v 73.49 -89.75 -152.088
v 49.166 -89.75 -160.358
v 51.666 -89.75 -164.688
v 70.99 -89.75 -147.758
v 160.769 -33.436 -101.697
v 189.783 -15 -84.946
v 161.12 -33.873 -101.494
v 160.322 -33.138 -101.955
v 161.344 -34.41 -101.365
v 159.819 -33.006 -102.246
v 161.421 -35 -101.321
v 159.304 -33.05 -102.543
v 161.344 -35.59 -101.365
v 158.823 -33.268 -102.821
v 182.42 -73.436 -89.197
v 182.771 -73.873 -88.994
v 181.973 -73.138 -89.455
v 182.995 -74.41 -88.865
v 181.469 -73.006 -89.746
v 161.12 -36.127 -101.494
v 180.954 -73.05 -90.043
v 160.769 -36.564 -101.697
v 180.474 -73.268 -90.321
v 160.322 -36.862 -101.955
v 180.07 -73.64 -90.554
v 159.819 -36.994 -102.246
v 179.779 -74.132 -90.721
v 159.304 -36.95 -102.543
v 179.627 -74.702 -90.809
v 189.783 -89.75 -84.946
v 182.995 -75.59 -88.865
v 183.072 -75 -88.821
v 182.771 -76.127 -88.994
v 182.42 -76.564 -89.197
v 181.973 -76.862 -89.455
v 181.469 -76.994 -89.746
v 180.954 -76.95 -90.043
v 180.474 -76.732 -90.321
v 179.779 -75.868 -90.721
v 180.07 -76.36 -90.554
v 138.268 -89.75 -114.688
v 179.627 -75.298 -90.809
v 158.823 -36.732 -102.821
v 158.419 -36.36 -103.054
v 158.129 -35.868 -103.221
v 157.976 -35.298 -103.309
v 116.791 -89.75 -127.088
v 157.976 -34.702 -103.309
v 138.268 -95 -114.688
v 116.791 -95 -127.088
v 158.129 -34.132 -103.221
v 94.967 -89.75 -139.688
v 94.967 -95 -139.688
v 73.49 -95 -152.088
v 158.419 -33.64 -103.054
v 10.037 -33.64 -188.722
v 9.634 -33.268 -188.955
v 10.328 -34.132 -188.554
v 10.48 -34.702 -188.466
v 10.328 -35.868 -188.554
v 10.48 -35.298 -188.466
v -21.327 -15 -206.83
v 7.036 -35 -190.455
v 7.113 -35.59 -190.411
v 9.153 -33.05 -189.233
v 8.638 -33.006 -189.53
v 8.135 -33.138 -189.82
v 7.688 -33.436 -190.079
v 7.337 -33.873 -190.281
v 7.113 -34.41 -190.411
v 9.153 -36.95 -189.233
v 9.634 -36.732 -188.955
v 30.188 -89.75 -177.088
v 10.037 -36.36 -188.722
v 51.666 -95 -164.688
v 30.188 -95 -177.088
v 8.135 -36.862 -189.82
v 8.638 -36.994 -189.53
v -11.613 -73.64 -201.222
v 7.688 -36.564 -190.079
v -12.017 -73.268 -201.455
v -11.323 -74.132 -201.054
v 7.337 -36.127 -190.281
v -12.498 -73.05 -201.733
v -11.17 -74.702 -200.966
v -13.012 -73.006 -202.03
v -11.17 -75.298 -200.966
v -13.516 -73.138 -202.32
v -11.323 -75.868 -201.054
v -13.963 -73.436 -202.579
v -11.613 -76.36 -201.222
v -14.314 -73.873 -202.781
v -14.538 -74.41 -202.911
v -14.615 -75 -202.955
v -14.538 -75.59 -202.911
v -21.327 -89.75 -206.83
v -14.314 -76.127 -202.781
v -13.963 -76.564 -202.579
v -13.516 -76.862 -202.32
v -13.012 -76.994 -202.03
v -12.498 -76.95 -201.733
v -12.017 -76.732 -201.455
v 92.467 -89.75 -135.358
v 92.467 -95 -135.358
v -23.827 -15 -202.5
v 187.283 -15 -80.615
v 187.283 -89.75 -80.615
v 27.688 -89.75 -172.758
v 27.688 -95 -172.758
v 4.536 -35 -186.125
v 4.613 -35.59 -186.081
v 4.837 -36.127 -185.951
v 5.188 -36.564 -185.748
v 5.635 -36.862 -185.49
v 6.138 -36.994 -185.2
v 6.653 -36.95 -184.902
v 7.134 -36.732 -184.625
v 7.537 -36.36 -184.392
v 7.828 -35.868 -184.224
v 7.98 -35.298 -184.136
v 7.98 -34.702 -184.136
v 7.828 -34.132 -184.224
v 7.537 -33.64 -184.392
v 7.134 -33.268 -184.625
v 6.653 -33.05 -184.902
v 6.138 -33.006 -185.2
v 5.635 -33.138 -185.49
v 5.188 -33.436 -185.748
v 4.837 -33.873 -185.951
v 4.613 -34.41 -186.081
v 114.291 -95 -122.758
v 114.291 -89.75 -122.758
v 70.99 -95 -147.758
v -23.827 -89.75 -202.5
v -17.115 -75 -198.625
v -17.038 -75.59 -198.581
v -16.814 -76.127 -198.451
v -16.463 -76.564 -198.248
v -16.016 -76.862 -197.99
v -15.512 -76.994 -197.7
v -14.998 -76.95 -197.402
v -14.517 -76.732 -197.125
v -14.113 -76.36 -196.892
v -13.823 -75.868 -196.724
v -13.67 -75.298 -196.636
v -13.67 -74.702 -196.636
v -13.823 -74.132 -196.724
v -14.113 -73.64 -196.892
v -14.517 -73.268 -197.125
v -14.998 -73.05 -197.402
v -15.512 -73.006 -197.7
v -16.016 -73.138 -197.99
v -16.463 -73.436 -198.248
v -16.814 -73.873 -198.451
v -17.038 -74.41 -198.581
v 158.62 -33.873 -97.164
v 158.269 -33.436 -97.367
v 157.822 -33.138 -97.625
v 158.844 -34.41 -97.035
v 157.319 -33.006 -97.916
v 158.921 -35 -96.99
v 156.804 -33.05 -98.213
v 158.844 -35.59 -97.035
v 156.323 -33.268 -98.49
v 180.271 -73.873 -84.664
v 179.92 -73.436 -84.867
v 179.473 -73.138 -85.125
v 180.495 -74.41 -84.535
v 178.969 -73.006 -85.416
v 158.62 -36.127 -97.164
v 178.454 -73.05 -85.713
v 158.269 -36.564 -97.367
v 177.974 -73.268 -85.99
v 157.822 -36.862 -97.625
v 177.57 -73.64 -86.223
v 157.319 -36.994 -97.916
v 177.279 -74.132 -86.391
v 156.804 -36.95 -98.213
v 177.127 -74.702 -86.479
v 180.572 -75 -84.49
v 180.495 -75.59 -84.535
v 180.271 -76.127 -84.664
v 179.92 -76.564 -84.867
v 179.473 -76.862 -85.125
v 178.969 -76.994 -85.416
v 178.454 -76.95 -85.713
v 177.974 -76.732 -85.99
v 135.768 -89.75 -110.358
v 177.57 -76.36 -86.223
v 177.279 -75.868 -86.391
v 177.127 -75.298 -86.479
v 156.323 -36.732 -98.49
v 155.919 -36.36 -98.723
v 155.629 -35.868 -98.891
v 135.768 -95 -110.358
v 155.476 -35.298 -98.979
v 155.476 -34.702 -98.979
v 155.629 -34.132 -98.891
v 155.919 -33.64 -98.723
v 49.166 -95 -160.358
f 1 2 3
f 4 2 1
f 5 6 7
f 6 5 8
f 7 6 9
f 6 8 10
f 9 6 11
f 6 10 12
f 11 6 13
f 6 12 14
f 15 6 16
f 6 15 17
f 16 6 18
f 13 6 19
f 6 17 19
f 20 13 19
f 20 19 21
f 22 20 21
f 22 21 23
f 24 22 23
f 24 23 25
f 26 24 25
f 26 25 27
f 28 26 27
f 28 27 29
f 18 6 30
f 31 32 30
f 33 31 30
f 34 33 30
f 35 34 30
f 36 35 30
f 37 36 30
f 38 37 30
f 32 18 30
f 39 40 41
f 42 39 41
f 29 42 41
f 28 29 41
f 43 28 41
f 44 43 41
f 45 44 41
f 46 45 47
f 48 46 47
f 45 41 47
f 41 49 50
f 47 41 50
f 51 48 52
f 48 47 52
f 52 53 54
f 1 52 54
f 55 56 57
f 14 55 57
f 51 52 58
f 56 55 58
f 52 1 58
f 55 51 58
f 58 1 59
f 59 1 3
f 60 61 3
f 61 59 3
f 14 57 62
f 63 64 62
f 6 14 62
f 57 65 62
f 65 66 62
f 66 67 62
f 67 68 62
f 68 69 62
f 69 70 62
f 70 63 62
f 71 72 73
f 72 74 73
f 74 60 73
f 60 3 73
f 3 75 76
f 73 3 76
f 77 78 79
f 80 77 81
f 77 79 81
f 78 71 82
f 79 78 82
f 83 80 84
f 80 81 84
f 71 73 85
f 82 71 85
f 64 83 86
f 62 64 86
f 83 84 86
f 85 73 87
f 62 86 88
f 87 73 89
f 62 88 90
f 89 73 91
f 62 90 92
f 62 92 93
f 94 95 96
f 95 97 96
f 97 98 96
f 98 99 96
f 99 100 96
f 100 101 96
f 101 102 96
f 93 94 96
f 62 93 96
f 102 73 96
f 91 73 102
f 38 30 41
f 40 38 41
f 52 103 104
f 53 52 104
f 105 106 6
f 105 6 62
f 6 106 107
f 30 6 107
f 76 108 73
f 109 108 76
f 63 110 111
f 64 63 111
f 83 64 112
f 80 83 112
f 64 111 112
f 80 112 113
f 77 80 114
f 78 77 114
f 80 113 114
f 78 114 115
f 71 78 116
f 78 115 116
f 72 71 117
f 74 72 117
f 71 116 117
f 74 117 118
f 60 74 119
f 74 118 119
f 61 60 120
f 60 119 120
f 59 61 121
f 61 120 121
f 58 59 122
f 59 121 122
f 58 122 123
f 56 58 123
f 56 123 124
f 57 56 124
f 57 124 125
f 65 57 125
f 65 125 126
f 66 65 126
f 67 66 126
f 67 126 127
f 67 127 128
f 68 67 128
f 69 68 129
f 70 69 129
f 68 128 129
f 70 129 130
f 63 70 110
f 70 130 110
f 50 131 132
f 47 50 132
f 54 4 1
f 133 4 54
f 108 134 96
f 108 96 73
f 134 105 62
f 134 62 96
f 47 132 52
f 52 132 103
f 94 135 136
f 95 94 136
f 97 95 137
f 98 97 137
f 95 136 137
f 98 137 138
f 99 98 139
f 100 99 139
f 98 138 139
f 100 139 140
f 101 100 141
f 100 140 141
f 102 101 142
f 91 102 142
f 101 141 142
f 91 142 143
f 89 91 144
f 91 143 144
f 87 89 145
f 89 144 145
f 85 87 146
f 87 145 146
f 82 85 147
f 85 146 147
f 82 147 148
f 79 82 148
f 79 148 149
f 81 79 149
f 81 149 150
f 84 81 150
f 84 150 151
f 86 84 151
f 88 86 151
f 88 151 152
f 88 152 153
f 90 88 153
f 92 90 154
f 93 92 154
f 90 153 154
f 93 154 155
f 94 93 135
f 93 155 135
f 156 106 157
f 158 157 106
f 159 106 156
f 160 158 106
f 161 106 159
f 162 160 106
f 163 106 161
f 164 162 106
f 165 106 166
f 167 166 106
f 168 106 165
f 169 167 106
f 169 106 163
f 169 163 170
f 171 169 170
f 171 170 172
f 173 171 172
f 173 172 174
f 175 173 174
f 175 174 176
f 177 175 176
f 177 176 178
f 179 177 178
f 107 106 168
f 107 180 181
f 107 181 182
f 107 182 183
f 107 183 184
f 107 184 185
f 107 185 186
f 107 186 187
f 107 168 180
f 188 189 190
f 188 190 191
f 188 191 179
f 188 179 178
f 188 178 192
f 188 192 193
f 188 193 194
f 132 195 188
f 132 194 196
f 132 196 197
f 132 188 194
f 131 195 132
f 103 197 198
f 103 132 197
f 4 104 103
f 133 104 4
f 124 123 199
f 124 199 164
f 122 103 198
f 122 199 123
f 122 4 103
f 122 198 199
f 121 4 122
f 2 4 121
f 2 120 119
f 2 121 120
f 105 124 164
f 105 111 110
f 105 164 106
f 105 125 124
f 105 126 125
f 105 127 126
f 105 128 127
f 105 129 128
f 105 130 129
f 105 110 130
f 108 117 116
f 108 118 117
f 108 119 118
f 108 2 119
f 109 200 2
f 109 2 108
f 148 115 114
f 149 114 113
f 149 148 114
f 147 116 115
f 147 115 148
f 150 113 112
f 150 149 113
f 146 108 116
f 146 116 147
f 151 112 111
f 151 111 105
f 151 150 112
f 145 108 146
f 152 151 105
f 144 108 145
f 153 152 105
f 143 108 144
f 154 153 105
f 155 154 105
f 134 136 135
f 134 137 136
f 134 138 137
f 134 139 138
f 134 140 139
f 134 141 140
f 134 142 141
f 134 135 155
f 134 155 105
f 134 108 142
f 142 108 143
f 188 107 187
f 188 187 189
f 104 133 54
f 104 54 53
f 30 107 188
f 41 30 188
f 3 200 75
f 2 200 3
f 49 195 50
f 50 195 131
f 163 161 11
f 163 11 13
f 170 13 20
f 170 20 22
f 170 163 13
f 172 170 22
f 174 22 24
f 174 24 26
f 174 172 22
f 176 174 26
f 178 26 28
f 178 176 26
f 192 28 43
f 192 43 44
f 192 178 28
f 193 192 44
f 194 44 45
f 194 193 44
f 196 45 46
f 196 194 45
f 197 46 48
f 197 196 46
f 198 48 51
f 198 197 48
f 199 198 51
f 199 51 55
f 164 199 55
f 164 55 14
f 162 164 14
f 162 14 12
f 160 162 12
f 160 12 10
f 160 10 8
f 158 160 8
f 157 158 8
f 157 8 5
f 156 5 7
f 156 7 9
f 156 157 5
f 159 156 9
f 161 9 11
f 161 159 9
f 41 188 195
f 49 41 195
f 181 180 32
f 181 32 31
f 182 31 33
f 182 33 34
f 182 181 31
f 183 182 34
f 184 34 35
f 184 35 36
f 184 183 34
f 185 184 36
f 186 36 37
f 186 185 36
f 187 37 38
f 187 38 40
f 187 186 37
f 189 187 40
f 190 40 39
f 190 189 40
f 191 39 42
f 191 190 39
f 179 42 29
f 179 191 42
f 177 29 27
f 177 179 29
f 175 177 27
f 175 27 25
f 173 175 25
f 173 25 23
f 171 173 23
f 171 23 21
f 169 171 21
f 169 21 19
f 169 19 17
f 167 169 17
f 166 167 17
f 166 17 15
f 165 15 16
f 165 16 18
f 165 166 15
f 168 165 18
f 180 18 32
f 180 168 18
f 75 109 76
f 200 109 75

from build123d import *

# Parameters (mm, degrees)
STOCK_FRAME_MASTER_1_START     = 163.456714755
STOCK_FRAME_MASTER_1_OUTLINE_R = 2
STOCK_FRAME_MASTER_1_DEPTH     = 5


# Read off the part's stored shape, not the designer's step: Stock-frame-master-1
with BuildPart() as part:
    # Stock-frame-master-1 outline → Stock-frame-master-1 (new body)
    with BuildSketch(Plane(origin=(0, 0, 0), x_dir=(0.866025403784438, 0, 0.500000000000001), z_dir=(0.500000000000001, 0, -0.866025403784438)).offset(STOCK_FRAME_MASTER_1_START)):
        Polygon((0, 15), (121.884572681, 15), (121.884572681, 89.75), (62.4, 89.75), (62.4, 95), (37.6, 95), (37.6, 89.75), (12.4, 89.75), (12.4, 95), (0, 95), align=None)
        with Locations((87.134572681, 35)):
            Circle(STOCK_FRAME_MASTER_1_OUTLINE_R, mode=Mode.SUBTRACT)
        with Locations((112.134572681, 75)):
            Circle(STOCK_FRAME_MASTER_1_OUTLINE_R, mode=Mode.SUBTRACT)
    extrude(amount=STOCK_FRAME_MASTER_1_DEPTH)

    # Mirror1: part across plane


with BuildPart() as part_1:
    add(part.part)
    add(part.part.mirror(Plane(origin=(81.728357378, -89.75, -141.557667397), x_dir=(-0.5000000000000008, 0, 0.8660254037844382), z_dir=(-0.8660254037844383, 0, -0.5000000000000008))))


solid = part_1.part
